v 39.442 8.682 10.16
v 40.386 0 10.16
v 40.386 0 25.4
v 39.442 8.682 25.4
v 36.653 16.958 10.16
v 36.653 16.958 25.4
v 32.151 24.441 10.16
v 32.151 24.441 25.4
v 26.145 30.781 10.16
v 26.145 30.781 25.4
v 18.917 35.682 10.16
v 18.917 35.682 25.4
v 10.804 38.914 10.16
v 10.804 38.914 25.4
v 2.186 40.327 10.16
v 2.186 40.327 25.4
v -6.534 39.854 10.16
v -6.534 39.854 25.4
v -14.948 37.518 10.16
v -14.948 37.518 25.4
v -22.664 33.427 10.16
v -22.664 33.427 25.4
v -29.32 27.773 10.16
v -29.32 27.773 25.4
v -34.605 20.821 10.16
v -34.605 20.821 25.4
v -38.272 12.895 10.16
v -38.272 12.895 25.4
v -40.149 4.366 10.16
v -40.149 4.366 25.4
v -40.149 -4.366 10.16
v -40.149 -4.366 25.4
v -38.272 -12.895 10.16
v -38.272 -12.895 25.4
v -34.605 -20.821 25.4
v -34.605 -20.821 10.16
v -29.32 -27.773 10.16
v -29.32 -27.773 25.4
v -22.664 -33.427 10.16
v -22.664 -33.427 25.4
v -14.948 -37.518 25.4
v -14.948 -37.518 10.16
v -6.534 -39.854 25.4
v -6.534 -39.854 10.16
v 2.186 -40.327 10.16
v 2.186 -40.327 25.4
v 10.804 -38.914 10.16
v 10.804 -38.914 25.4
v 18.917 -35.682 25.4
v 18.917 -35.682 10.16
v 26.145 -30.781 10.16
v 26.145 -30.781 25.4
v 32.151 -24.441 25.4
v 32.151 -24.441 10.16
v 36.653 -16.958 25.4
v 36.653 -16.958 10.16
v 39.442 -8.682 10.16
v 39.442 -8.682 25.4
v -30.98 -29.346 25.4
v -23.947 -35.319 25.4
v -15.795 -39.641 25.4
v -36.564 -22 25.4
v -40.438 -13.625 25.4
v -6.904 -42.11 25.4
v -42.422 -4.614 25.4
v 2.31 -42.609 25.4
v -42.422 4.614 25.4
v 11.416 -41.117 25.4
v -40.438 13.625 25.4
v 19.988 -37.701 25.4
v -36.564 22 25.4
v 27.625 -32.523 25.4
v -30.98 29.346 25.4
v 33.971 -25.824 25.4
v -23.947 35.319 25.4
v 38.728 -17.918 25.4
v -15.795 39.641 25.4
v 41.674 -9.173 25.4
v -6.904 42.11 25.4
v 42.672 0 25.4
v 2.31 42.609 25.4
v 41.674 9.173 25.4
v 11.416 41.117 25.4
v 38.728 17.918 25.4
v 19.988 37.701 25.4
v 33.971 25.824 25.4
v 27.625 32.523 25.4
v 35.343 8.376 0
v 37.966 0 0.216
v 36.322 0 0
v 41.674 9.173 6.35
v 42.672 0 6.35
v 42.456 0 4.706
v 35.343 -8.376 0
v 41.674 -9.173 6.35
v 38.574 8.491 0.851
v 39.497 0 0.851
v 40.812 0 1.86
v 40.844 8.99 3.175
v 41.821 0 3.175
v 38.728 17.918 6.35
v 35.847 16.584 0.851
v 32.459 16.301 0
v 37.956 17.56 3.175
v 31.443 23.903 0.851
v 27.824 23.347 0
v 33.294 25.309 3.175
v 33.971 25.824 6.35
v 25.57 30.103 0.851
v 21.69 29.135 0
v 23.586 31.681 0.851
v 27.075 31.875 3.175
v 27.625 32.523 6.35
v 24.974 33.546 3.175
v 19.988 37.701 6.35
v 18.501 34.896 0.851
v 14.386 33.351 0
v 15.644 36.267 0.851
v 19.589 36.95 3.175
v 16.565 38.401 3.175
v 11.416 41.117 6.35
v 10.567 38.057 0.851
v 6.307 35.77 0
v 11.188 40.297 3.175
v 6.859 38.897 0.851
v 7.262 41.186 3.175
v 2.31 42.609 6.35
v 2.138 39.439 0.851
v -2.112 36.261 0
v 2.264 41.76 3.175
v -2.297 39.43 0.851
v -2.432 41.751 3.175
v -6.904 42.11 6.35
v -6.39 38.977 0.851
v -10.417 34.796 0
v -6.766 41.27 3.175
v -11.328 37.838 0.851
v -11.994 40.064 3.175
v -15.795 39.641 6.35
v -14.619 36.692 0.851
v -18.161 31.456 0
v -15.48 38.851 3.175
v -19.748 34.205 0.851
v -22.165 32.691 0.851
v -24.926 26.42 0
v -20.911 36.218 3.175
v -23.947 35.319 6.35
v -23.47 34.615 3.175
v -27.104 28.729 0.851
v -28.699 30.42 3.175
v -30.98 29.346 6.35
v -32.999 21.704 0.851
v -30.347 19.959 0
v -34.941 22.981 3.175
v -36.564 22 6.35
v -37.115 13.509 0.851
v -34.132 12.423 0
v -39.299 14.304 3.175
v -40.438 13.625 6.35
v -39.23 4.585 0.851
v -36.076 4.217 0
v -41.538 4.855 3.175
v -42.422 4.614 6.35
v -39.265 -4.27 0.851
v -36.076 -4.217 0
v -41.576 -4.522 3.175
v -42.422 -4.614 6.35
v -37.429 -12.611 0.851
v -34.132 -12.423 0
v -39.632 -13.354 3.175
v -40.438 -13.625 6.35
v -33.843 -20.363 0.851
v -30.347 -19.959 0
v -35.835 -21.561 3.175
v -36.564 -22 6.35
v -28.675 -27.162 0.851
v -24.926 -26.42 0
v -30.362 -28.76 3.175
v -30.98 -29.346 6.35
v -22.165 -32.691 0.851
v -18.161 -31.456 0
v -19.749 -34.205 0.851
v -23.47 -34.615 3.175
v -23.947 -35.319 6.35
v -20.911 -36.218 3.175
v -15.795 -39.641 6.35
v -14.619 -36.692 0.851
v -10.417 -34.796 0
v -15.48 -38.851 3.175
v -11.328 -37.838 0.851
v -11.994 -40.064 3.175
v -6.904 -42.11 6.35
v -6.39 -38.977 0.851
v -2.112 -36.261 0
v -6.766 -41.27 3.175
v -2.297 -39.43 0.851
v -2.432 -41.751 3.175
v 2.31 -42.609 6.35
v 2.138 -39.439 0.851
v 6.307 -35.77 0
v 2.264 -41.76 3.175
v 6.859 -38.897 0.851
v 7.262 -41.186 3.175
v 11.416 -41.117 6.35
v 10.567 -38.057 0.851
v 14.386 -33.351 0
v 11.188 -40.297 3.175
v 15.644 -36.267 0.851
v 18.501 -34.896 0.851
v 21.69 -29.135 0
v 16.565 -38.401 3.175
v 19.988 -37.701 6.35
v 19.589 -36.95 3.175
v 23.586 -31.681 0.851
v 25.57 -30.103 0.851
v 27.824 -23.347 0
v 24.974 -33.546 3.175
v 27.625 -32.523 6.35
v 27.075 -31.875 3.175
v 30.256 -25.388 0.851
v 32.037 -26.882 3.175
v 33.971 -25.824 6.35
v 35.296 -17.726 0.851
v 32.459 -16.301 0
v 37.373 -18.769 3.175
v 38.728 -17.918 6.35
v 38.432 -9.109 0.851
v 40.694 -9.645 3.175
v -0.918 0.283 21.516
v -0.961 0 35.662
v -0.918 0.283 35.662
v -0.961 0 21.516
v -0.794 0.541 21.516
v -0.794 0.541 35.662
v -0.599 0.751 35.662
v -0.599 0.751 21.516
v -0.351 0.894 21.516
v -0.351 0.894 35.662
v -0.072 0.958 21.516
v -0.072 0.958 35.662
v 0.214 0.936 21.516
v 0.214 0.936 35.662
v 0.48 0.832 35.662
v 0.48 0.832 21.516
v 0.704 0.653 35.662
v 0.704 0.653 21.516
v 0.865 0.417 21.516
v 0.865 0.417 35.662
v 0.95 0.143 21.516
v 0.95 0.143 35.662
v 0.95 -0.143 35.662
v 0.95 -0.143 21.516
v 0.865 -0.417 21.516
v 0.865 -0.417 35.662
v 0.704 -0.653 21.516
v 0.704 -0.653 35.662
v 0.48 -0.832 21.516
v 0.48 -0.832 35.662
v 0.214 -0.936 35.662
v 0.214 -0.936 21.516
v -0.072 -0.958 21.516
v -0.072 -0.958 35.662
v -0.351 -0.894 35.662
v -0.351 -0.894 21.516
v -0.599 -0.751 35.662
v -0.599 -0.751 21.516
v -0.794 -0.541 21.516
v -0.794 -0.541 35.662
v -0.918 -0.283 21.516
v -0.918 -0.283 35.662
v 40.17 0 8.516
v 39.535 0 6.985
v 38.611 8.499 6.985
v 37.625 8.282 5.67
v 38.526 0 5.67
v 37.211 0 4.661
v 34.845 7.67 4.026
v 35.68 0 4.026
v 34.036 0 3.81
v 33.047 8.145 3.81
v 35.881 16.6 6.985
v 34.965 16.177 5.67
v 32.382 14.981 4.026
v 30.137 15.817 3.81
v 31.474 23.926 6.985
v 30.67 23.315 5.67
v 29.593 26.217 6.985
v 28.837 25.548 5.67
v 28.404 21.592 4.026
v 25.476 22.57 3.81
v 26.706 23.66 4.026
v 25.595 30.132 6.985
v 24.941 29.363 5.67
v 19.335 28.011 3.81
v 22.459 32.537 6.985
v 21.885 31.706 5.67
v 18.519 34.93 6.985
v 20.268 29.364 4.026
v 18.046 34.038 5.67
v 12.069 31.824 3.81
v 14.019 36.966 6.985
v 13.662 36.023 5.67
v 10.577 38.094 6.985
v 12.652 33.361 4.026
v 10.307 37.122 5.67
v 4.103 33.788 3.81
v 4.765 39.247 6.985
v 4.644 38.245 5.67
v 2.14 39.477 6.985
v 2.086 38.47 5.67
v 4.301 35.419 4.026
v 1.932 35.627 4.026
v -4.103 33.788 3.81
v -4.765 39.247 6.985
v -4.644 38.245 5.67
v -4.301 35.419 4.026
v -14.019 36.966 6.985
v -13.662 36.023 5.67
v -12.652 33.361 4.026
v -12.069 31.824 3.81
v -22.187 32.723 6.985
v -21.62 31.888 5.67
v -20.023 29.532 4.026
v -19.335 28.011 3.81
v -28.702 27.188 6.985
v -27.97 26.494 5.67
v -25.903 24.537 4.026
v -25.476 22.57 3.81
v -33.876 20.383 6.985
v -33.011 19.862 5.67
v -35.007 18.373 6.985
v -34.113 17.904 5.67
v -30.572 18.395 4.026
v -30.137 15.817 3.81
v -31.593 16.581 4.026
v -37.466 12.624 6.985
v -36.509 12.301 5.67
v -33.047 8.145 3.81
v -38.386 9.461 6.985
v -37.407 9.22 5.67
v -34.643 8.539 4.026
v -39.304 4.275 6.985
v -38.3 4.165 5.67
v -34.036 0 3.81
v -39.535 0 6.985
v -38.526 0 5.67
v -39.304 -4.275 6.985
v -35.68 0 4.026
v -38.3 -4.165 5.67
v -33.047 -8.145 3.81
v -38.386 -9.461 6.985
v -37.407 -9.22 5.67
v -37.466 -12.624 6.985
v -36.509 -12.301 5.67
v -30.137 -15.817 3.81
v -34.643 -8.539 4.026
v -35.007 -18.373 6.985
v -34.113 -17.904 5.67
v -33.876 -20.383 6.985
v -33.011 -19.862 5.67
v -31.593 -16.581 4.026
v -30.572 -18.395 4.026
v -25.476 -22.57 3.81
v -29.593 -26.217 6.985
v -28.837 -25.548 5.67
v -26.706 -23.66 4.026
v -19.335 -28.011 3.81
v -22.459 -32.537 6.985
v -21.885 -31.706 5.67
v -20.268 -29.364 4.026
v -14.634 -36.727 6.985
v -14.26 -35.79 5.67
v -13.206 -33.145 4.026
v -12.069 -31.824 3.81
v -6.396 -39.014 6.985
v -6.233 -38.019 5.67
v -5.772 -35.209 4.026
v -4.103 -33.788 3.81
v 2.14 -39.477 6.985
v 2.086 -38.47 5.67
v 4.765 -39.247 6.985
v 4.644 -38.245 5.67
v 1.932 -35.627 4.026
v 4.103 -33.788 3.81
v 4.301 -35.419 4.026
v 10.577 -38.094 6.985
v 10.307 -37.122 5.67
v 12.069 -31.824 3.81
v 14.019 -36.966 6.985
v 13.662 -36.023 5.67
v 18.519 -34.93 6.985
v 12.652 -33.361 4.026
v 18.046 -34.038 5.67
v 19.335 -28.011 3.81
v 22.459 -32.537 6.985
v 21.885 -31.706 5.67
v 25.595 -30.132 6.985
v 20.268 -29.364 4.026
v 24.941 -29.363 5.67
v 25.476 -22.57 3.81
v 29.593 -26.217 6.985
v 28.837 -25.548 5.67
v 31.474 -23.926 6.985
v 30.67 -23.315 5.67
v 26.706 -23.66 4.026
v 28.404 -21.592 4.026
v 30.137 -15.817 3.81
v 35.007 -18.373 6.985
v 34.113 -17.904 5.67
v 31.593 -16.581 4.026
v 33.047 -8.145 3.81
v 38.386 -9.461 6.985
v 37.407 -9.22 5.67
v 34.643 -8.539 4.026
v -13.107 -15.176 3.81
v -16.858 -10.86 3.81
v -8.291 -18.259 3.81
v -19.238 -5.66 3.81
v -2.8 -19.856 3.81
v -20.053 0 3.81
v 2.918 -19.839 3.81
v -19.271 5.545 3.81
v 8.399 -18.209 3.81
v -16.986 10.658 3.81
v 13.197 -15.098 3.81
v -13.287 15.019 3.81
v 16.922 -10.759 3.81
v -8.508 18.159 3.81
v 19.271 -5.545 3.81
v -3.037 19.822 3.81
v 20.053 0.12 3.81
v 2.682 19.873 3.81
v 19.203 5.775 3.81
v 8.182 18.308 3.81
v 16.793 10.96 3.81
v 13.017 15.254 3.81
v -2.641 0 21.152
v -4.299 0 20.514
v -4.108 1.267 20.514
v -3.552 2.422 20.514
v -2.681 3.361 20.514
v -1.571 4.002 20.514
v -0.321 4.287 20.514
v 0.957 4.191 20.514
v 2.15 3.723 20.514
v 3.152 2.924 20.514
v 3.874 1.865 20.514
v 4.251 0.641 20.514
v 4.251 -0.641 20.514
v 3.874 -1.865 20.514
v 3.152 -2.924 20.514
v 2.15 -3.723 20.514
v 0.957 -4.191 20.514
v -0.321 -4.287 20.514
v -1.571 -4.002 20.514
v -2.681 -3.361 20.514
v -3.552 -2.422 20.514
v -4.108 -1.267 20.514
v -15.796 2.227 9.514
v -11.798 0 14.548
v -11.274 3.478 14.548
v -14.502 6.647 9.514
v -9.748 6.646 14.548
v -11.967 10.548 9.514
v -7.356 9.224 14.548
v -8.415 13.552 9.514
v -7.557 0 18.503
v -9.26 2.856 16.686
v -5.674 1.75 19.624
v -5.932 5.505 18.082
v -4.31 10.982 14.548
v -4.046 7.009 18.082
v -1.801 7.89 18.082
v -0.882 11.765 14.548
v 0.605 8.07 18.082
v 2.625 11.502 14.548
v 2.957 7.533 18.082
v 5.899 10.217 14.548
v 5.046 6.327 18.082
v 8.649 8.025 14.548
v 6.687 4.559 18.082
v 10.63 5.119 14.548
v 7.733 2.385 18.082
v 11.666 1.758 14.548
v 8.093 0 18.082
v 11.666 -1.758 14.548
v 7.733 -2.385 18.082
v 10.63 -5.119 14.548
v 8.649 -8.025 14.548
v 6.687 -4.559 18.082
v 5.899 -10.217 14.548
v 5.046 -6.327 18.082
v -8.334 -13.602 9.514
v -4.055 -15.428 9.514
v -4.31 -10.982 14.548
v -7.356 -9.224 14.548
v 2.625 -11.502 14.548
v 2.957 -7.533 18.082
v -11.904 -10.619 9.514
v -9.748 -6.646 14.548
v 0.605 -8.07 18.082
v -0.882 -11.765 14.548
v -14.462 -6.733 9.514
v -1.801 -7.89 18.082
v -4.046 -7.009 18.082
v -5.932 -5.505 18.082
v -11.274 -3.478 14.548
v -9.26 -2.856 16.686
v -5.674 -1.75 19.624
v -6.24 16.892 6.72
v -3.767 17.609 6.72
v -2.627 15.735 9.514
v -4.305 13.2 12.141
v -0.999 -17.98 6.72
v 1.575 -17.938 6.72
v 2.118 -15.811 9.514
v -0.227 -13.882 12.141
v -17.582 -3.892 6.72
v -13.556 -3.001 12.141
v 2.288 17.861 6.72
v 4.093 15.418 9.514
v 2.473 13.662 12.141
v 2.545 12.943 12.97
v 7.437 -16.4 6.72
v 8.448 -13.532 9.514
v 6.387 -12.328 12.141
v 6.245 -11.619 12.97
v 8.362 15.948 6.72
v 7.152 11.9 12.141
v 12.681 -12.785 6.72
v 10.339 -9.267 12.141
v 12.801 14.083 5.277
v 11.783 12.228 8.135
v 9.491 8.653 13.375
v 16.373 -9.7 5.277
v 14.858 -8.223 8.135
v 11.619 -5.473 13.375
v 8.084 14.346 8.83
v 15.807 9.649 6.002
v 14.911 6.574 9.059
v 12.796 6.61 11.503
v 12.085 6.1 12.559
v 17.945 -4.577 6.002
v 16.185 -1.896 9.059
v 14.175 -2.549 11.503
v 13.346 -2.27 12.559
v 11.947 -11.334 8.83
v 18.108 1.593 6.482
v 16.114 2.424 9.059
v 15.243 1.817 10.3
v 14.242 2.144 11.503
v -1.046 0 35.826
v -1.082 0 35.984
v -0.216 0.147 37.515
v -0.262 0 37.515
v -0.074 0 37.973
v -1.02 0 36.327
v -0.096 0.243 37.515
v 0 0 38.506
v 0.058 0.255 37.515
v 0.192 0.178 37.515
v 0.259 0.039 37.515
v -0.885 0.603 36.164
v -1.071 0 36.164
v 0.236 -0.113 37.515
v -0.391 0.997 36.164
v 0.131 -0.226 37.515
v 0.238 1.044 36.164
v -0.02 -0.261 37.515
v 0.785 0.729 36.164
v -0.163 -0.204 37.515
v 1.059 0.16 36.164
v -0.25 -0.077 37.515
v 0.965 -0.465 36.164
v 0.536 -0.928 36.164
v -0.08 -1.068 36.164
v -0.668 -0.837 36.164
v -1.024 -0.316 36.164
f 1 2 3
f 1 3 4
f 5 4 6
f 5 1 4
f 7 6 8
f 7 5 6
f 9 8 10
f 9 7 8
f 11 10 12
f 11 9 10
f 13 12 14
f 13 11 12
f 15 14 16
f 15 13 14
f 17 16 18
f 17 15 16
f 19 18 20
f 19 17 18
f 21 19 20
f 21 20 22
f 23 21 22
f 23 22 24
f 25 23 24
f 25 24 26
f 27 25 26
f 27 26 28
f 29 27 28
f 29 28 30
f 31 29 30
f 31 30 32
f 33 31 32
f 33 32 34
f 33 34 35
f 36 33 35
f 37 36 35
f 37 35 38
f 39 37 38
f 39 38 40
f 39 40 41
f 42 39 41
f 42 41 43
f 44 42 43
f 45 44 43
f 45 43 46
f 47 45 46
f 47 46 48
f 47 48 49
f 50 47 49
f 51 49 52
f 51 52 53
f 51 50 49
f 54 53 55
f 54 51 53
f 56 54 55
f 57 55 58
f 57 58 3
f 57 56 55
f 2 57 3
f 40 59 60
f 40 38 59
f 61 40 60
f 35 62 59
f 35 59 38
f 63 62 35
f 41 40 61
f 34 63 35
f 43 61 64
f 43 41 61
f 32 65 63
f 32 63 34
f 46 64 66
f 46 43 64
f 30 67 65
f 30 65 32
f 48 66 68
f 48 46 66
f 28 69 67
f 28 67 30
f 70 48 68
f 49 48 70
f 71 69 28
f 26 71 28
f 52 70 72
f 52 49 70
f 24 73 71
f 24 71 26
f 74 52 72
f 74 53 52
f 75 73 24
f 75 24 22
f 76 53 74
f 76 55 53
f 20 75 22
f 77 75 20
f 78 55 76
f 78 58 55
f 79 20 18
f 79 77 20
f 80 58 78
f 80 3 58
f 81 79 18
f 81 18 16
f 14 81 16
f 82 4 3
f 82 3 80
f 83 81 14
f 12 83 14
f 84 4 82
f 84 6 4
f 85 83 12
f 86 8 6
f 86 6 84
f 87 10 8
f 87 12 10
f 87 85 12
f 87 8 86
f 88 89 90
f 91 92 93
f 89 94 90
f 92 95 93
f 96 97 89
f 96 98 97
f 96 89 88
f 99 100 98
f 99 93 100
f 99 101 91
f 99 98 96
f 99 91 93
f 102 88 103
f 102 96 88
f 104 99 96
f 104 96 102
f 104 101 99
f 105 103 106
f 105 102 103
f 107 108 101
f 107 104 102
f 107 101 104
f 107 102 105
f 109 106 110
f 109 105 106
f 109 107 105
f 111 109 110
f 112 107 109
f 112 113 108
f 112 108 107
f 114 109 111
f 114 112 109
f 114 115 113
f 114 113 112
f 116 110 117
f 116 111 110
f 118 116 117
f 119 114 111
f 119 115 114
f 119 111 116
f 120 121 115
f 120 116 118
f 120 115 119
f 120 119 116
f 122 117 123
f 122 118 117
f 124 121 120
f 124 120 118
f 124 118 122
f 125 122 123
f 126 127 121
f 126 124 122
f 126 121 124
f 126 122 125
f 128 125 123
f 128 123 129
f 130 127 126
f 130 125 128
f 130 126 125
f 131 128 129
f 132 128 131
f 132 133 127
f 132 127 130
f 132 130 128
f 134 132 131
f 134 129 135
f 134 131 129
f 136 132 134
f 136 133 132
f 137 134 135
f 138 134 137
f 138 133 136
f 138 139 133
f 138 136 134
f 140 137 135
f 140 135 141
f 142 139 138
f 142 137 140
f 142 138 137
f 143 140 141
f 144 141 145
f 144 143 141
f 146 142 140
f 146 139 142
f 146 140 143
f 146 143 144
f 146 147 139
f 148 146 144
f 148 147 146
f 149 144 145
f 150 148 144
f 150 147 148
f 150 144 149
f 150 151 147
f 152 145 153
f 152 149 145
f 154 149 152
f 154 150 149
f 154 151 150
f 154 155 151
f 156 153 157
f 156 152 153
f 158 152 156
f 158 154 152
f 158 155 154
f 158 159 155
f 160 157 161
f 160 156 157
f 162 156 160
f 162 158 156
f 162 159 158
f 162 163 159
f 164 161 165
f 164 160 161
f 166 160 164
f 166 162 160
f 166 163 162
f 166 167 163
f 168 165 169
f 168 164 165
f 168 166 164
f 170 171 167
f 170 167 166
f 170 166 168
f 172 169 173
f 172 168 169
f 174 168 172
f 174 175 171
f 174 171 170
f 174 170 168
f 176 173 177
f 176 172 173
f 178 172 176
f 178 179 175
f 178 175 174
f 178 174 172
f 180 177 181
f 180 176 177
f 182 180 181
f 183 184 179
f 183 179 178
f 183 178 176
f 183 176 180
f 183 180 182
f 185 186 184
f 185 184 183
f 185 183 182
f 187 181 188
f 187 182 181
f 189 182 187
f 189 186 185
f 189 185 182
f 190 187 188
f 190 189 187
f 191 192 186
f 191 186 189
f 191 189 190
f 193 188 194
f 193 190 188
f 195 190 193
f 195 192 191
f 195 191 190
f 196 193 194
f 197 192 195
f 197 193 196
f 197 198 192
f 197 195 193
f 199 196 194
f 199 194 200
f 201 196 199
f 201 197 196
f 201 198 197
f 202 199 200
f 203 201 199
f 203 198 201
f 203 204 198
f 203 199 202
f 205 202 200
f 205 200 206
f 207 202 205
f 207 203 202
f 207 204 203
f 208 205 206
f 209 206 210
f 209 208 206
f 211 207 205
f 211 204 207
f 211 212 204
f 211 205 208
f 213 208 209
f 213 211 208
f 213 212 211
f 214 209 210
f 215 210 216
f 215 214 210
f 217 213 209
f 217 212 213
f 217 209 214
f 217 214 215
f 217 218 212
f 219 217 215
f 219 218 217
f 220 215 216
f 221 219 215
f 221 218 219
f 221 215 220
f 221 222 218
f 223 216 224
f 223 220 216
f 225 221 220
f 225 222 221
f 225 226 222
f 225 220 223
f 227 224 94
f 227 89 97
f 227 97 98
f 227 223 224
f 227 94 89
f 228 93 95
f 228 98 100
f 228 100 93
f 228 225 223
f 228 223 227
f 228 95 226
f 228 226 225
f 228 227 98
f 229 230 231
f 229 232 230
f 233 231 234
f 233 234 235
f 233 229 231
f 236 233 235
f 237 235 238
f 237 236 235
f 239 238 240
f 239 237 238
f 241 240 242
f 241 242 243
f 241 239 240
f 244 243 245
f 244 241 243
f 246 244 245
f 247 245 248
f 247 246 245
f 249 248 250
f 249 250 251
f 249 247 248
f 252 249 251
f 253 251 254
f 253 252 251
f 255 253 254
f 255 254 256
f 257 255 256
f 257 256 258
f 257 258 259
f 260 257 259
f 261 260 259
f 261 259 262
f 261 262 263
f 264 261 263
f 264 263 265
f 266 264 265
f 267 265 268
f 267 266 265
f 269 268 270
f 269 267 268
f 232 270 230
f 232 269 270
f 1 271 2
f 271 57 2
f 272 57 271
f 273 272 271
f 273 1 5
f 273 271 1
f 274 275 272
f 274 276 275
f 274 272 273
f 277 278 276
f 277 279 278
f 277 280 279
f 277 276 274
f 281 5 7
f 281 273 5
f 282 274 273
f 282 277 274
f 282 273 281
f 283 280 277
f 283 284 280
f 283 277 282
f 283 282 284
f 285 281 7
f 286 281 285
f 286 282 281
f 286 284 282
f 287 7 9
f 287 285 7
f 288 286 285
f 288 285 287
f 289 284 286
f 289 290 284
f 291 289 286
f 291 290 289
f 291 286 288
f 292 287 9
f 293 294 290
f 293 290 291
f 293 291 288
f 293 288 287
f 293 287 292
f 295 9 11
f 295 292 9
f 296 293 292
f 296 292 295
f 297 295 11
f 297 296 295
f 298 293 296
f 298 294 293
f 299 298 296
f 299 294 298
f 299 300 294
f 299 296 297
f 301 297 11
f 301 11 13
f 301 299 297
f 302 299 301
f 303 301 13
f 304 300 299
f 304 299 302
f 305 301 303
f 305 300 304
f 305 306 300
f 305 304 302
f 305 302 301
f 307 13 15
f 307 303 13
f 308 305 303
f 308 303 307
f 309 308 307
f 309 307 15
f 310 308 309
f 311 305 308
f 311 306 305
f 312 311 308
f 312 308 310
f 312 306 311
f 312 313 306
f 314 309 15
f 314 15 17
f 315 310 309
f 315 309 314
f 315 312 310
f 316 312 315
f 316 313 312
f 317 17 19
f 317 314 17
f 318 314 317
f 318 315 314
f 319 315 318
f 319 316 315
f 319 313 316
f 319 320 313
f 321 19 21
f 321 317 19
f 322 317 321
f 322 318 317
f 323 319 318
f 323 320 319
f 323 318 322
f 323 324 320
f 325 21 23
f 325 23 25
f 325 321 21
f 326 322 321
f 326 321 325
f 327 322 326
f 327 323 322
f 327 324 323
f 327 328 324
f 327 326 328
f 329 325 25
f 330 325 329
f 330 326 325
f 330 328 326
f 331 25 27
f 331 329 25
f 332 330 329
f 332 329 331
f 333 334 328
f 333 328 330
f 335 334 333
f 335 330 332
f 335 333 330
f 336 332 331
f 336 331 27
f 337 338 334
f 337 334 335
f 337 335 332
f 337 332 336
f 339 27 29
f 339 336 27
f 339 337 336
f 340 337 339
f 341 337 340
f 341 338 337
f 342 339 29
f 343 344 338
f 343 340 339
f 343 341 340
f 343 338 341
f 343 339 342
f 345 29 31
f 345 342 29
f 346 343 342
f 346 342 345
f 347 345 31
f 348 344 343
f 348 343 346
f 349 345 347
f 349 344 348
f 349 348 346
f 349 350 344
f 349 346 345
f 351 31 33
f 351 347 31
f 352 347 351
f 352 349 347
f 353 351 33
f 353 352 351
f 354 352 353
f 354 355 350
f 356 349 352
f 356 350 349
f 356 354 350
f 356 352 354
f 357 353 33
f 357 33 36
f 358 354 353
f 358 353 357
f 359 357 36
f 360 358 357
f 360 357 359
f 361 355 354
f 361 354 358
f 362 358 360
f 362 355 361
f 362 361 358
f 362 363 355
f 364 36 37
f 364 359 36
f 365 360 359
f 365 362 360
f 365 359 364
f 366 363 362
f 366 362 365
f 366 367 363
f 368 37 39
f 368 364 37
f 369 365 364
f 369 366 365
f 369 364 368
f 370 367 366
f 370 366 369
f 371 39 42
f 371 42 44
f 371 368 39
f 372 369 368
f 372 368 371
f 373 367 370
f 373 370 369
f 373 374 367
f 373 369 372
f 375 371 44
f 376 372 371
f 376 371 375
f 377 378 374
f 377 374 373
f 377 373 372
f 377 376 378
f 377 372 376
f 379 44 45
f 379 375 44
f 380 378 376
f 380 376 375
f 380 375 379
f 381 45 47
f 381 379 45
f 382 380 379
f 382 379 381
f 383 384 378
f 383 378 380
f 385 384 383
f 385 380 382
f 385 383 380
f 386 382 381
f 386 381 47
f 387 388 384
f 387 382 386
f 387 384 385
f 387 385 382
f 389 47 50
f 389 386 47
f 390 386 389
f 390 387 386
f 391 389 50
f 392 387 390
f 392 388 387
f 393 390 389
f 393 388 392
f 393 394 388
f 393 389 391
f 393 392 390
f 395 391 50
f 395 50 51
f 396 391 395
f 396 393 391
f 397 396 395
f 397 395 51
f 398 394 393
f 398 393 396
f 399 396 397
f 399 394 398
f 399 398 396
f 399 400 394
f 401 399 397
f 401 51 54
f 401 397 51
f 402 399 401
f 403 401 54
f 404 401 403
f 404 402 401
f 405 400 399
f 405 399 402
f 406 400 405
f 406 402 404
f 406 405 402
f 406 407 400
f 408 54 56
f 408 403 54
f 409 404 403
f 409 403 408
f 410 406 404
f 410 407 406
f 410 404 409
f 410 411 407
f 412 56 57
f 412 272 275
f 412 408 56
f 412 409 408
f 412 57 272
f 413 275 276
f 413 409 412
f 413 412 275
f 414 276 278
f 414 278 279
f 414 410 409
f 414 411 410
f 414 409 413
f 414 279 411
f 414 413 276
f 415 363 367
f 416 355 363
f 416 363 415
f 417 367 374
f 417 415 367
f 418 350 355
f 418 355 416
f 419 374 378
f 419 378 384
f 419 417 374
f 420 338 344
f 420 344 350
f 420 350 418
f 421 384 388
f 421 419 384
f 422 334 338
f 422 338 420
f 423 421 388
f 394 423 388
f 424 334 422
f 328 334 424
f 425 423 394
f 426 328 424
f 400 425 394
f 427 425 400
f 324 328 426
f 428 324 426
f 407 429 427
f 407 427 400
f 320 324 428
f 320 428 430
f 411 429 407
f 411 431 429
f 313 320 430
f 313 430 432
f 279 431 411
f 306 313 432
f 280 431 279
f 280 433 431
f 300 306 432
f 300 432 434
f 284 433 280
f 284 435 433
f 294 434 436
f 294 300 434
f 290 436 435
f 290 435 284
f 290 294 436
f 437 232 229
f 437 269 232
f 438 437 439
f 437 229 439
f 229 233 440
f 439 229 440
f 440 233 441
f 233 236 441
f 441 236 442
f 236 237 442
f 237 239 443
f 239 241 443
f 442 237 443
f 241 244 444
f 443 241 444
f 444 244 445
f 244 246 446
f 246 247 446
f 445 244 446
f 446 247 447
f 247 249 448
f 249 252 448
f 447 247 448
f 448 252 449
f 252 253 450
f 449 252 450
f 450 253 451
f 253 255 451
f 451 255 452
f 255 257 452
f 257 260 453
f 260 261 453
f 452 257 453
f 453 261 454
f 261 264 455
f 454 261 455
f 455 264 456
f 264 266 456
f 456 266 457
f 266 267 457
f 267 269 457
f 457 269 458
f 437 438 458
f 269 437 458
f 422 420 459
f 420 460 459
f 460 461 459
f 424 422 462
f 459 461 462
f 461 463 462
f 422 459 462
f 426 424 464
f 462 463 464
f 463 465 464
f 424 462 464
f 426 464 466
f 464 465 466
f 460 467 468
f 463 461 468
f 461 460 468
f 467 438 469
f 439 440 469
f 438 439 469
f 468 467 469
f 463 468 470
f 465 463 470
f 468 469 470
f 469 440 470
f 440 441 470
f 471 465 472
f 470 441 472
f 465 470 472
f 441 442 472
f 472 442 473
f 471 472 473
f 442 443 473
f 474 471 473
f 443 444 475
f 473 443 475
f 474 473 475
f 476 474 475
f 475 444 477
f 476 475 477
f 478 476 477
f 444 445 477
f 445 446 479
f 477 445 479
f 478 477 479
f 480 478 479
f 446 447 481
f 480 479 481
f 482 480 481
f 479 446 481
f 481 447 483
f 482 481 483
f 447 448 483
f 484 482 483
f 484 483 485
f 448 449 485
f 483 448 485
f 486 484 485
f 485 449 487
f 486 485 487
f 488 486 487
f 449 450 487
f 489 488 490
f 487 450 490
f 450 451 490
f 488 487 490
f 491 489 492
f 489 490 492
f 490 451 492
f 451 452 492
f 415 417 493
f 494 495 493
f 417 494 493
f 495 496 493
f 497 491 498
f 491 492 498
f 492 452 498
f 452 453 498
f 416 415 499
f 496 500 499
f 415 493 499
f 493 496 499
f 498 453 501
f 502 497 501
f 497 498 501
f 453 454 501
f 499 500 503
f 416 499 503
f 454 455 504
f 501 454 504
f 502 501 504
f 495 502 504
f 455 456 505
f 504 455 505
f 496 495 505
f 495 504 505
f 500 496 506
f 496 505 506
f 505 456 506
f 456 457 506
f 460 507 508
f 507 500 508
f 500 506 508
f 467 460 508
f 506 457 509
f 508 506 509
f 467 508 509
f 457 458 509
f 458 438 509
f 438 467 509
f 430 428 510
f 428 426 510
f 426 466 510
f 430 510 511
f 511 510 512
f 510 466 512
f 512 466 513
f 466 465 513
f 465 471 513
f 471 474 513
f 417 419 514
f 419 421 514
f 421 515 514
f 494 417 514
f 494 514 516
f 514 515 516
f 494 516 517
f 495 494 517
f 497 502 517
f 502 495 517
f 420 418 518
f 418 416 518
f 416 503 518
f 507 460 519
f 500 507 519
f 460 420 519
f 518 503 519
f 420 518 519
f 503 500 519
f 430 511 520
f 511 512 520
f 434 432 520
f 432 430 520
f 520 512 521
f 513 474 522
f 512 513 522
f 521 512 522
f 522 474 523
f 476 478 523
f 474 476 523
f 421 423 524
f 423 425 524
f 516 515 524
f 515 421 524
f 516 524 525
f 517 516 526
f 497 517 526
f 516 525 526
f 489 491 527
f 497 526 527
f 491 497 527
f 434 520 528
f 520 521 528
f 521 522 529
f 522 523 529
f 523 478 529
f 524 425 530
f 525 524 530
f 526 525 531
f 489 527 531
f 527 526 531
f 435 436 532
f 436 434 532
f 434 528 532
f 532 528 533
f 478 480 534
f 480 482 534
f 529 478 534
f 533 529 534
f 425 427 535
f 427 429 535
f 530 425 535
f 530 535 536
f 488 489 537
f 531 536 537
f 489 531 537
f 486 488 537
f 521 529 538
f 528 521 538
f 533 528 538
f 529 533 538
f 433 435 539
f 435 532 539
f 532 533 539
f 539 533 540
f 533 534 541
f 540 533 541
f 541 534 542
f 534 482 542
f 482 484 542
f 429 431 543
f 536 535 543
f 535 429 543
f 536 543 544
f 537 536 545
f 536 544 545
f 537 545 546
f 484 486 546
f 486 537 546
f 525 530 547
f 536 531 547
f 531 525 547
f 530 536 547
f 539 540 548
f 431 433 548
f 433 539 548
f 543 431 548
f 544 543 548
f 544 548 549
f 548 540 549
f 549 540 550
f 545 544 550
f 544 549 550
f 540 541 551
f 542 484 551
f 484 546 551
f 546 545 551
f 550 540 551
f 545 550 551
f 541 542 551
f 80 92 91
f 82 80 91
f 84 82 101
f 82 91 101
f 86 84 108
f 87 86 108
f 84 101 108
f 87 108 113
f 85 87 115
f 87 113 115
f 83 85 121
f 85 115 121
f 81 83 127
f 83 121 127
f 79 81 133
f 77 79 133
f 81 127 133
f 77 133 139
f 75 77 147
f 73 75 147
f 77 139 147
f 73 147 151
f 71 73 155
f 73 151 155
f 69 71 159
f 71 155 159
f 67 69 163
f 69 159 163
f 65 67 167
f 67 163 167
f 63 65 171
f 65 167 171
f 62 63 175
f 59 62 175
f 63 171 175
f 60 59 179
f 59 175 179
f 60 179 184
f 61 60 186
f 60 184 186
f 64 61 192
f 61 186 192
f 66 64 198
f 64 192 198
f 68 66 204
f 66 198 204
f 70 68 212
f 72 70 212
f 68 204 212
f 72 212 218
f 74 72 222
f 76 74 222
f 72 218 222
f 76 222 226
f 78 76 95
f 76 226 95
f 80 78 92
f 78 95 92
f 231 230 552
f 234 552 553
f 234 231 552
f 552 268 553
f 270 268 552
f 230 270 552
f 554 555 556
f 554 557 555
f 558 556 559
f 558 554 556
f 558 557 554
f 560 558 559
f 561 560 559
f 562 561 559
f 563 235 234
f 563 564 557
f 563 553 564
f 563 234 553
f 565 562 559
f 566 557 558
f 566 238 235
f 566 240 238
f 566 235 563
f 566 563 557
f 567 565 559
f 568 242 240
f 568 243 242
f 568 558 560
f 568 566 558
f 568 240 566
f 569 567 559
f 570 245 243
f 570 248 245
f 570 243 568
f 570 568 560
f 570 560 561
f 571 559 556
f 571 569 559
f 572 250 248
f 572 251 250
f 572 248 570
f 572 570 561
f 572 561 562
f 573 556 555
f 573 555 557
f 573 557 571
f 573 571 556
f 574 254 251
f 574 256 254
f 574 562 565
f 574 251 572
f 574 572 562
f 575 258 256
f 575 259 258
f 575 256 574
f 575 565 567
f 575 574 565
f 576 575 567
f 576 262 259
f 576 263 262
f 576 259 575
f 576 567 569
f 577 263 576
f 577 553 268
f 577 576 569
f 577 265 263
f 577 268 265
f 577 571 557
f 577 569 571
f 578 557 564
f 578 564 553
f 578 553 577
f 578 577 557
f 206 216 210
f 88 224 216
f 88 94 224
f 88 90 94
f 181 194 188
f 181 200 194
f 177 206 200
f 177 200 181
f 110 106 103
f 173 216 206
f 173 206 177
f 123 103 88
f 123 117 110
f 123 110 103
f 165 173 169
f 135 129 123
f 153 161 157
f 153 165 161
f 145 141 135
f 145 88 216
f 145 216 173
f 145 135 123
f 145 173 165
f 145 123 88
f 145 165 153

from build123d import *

# Parameters (mm, degrees)
F0_R     = 42.672
F0_R_2   = 40.386
F2_DEPTH = 25.4
F3_DEPTH = 3.81
F5_R     = 6.35


# Not quite as in the source:
# - a feature names something its author has since deleted; it is built from what else it names


with BuildPart() as f2:
    # F0 (on Top) → F2 (new body)
    with BuildSketch(Plane.XY):
        Circle(F0_R)
        Circle(F0_R_2, mode=Mode.SUBTRACT)
    extrude(amount=F2_DEPTH)

    # F0 (on Top) → F3 (join)
    with BuildSketch(Plane.XY):
        Circle(F0_R_2)
    extrude(amount=F3_DEPTH)

    # F1 (on Front) → F4 (revolve)
    with BuildSketch(Plane.XZ):
        with BuildLine():
            Line((-22.661603124, 0), (-0.3999708066, 0))
            Line((-0.3999708066, 0), (0, 0))
            Line((0, 0), (0, 21.5927247815))
            add(Edge.make_bspline(
                [(-0.9605343803, 21.5162747094), (-0.7741159133, 21.5404865376), (-0.4544785974, 21.5726982013), (-0.1335448781, 21.5887811226), (0, 21.5927247815)],
                knots=[0.4844452831, 0.4844452831, 0.4844452831, 0.4844452831, 0.4961290643, 0.5044321792, 0.5044321792, 0.5044321792, 0.5044321792], degree=3))
            add(Edge.make_bspline(
                [(-22.661603124, 0), (-15.6758083409, 10.256190155), (-8.6900138326, 20.5123783076), (-0.9605343803, 21.5162747094)],
                knots=[0, 0, 0, 0, 0.4844452831, 0.4844452831, 0.4844452831, 0.4844452831], degree=3))
        make_face()
        with BuildLine():
            Line((-0.9605343803, 35.6623469879), (0, 35.6623469879))
            Line((0, 35.6623469879), (0, 38.5057479143))
            add(Edge.make_bspline(
                [(0, 38.5057479143), (0, 37.0840474511), (-1.5196733875, 36.4921689034), (-0.9605343803, 35.6623469879)],
                knots=[0, 0, 0, 0, 3.0012589232, 3.0012589232, 3.0012589232, 3.0012589232], degree=3))
        make_face()
        with BuildLine():
            add(Edge.make_bspline(
                [(-0.9605343803, 21.5162747094), (-0.7741159133, 21.5404865376), (-0.4544785974, 21.5726982013), (-0.1335448781, 21.5887811226), (0, 21.5927247815)],
                knots=[0.4844452831, 0.4844452831, 0.4844452831, 0.4844452831, 0.4961290643, 0.5044321792, 0.5044321792, 0.5044321792, 0.5044321792], degree=3))
            Line((0, 21.5927247815), (0, 35.6623469879))
            Line((0, 35.6623469879), (-0.9605343803, 35.6623469879))
            Line((-0.9605343803, 35.6623469879), (-0.9605343803, 21.5162747094))
        make_face()
    revolve(axis=Axis((0, 0, 17.8311734939), (0, 0, -1)))

    # F5
    f5_edges = [f2.edges().sort_by_distance(p)[0] for p in [
        (-40.386, 0, 3.81),
        (-42.672, 0, 0),
    ]]
    fillet(f5_edges, radius=F5_R)


solid = f2.part
